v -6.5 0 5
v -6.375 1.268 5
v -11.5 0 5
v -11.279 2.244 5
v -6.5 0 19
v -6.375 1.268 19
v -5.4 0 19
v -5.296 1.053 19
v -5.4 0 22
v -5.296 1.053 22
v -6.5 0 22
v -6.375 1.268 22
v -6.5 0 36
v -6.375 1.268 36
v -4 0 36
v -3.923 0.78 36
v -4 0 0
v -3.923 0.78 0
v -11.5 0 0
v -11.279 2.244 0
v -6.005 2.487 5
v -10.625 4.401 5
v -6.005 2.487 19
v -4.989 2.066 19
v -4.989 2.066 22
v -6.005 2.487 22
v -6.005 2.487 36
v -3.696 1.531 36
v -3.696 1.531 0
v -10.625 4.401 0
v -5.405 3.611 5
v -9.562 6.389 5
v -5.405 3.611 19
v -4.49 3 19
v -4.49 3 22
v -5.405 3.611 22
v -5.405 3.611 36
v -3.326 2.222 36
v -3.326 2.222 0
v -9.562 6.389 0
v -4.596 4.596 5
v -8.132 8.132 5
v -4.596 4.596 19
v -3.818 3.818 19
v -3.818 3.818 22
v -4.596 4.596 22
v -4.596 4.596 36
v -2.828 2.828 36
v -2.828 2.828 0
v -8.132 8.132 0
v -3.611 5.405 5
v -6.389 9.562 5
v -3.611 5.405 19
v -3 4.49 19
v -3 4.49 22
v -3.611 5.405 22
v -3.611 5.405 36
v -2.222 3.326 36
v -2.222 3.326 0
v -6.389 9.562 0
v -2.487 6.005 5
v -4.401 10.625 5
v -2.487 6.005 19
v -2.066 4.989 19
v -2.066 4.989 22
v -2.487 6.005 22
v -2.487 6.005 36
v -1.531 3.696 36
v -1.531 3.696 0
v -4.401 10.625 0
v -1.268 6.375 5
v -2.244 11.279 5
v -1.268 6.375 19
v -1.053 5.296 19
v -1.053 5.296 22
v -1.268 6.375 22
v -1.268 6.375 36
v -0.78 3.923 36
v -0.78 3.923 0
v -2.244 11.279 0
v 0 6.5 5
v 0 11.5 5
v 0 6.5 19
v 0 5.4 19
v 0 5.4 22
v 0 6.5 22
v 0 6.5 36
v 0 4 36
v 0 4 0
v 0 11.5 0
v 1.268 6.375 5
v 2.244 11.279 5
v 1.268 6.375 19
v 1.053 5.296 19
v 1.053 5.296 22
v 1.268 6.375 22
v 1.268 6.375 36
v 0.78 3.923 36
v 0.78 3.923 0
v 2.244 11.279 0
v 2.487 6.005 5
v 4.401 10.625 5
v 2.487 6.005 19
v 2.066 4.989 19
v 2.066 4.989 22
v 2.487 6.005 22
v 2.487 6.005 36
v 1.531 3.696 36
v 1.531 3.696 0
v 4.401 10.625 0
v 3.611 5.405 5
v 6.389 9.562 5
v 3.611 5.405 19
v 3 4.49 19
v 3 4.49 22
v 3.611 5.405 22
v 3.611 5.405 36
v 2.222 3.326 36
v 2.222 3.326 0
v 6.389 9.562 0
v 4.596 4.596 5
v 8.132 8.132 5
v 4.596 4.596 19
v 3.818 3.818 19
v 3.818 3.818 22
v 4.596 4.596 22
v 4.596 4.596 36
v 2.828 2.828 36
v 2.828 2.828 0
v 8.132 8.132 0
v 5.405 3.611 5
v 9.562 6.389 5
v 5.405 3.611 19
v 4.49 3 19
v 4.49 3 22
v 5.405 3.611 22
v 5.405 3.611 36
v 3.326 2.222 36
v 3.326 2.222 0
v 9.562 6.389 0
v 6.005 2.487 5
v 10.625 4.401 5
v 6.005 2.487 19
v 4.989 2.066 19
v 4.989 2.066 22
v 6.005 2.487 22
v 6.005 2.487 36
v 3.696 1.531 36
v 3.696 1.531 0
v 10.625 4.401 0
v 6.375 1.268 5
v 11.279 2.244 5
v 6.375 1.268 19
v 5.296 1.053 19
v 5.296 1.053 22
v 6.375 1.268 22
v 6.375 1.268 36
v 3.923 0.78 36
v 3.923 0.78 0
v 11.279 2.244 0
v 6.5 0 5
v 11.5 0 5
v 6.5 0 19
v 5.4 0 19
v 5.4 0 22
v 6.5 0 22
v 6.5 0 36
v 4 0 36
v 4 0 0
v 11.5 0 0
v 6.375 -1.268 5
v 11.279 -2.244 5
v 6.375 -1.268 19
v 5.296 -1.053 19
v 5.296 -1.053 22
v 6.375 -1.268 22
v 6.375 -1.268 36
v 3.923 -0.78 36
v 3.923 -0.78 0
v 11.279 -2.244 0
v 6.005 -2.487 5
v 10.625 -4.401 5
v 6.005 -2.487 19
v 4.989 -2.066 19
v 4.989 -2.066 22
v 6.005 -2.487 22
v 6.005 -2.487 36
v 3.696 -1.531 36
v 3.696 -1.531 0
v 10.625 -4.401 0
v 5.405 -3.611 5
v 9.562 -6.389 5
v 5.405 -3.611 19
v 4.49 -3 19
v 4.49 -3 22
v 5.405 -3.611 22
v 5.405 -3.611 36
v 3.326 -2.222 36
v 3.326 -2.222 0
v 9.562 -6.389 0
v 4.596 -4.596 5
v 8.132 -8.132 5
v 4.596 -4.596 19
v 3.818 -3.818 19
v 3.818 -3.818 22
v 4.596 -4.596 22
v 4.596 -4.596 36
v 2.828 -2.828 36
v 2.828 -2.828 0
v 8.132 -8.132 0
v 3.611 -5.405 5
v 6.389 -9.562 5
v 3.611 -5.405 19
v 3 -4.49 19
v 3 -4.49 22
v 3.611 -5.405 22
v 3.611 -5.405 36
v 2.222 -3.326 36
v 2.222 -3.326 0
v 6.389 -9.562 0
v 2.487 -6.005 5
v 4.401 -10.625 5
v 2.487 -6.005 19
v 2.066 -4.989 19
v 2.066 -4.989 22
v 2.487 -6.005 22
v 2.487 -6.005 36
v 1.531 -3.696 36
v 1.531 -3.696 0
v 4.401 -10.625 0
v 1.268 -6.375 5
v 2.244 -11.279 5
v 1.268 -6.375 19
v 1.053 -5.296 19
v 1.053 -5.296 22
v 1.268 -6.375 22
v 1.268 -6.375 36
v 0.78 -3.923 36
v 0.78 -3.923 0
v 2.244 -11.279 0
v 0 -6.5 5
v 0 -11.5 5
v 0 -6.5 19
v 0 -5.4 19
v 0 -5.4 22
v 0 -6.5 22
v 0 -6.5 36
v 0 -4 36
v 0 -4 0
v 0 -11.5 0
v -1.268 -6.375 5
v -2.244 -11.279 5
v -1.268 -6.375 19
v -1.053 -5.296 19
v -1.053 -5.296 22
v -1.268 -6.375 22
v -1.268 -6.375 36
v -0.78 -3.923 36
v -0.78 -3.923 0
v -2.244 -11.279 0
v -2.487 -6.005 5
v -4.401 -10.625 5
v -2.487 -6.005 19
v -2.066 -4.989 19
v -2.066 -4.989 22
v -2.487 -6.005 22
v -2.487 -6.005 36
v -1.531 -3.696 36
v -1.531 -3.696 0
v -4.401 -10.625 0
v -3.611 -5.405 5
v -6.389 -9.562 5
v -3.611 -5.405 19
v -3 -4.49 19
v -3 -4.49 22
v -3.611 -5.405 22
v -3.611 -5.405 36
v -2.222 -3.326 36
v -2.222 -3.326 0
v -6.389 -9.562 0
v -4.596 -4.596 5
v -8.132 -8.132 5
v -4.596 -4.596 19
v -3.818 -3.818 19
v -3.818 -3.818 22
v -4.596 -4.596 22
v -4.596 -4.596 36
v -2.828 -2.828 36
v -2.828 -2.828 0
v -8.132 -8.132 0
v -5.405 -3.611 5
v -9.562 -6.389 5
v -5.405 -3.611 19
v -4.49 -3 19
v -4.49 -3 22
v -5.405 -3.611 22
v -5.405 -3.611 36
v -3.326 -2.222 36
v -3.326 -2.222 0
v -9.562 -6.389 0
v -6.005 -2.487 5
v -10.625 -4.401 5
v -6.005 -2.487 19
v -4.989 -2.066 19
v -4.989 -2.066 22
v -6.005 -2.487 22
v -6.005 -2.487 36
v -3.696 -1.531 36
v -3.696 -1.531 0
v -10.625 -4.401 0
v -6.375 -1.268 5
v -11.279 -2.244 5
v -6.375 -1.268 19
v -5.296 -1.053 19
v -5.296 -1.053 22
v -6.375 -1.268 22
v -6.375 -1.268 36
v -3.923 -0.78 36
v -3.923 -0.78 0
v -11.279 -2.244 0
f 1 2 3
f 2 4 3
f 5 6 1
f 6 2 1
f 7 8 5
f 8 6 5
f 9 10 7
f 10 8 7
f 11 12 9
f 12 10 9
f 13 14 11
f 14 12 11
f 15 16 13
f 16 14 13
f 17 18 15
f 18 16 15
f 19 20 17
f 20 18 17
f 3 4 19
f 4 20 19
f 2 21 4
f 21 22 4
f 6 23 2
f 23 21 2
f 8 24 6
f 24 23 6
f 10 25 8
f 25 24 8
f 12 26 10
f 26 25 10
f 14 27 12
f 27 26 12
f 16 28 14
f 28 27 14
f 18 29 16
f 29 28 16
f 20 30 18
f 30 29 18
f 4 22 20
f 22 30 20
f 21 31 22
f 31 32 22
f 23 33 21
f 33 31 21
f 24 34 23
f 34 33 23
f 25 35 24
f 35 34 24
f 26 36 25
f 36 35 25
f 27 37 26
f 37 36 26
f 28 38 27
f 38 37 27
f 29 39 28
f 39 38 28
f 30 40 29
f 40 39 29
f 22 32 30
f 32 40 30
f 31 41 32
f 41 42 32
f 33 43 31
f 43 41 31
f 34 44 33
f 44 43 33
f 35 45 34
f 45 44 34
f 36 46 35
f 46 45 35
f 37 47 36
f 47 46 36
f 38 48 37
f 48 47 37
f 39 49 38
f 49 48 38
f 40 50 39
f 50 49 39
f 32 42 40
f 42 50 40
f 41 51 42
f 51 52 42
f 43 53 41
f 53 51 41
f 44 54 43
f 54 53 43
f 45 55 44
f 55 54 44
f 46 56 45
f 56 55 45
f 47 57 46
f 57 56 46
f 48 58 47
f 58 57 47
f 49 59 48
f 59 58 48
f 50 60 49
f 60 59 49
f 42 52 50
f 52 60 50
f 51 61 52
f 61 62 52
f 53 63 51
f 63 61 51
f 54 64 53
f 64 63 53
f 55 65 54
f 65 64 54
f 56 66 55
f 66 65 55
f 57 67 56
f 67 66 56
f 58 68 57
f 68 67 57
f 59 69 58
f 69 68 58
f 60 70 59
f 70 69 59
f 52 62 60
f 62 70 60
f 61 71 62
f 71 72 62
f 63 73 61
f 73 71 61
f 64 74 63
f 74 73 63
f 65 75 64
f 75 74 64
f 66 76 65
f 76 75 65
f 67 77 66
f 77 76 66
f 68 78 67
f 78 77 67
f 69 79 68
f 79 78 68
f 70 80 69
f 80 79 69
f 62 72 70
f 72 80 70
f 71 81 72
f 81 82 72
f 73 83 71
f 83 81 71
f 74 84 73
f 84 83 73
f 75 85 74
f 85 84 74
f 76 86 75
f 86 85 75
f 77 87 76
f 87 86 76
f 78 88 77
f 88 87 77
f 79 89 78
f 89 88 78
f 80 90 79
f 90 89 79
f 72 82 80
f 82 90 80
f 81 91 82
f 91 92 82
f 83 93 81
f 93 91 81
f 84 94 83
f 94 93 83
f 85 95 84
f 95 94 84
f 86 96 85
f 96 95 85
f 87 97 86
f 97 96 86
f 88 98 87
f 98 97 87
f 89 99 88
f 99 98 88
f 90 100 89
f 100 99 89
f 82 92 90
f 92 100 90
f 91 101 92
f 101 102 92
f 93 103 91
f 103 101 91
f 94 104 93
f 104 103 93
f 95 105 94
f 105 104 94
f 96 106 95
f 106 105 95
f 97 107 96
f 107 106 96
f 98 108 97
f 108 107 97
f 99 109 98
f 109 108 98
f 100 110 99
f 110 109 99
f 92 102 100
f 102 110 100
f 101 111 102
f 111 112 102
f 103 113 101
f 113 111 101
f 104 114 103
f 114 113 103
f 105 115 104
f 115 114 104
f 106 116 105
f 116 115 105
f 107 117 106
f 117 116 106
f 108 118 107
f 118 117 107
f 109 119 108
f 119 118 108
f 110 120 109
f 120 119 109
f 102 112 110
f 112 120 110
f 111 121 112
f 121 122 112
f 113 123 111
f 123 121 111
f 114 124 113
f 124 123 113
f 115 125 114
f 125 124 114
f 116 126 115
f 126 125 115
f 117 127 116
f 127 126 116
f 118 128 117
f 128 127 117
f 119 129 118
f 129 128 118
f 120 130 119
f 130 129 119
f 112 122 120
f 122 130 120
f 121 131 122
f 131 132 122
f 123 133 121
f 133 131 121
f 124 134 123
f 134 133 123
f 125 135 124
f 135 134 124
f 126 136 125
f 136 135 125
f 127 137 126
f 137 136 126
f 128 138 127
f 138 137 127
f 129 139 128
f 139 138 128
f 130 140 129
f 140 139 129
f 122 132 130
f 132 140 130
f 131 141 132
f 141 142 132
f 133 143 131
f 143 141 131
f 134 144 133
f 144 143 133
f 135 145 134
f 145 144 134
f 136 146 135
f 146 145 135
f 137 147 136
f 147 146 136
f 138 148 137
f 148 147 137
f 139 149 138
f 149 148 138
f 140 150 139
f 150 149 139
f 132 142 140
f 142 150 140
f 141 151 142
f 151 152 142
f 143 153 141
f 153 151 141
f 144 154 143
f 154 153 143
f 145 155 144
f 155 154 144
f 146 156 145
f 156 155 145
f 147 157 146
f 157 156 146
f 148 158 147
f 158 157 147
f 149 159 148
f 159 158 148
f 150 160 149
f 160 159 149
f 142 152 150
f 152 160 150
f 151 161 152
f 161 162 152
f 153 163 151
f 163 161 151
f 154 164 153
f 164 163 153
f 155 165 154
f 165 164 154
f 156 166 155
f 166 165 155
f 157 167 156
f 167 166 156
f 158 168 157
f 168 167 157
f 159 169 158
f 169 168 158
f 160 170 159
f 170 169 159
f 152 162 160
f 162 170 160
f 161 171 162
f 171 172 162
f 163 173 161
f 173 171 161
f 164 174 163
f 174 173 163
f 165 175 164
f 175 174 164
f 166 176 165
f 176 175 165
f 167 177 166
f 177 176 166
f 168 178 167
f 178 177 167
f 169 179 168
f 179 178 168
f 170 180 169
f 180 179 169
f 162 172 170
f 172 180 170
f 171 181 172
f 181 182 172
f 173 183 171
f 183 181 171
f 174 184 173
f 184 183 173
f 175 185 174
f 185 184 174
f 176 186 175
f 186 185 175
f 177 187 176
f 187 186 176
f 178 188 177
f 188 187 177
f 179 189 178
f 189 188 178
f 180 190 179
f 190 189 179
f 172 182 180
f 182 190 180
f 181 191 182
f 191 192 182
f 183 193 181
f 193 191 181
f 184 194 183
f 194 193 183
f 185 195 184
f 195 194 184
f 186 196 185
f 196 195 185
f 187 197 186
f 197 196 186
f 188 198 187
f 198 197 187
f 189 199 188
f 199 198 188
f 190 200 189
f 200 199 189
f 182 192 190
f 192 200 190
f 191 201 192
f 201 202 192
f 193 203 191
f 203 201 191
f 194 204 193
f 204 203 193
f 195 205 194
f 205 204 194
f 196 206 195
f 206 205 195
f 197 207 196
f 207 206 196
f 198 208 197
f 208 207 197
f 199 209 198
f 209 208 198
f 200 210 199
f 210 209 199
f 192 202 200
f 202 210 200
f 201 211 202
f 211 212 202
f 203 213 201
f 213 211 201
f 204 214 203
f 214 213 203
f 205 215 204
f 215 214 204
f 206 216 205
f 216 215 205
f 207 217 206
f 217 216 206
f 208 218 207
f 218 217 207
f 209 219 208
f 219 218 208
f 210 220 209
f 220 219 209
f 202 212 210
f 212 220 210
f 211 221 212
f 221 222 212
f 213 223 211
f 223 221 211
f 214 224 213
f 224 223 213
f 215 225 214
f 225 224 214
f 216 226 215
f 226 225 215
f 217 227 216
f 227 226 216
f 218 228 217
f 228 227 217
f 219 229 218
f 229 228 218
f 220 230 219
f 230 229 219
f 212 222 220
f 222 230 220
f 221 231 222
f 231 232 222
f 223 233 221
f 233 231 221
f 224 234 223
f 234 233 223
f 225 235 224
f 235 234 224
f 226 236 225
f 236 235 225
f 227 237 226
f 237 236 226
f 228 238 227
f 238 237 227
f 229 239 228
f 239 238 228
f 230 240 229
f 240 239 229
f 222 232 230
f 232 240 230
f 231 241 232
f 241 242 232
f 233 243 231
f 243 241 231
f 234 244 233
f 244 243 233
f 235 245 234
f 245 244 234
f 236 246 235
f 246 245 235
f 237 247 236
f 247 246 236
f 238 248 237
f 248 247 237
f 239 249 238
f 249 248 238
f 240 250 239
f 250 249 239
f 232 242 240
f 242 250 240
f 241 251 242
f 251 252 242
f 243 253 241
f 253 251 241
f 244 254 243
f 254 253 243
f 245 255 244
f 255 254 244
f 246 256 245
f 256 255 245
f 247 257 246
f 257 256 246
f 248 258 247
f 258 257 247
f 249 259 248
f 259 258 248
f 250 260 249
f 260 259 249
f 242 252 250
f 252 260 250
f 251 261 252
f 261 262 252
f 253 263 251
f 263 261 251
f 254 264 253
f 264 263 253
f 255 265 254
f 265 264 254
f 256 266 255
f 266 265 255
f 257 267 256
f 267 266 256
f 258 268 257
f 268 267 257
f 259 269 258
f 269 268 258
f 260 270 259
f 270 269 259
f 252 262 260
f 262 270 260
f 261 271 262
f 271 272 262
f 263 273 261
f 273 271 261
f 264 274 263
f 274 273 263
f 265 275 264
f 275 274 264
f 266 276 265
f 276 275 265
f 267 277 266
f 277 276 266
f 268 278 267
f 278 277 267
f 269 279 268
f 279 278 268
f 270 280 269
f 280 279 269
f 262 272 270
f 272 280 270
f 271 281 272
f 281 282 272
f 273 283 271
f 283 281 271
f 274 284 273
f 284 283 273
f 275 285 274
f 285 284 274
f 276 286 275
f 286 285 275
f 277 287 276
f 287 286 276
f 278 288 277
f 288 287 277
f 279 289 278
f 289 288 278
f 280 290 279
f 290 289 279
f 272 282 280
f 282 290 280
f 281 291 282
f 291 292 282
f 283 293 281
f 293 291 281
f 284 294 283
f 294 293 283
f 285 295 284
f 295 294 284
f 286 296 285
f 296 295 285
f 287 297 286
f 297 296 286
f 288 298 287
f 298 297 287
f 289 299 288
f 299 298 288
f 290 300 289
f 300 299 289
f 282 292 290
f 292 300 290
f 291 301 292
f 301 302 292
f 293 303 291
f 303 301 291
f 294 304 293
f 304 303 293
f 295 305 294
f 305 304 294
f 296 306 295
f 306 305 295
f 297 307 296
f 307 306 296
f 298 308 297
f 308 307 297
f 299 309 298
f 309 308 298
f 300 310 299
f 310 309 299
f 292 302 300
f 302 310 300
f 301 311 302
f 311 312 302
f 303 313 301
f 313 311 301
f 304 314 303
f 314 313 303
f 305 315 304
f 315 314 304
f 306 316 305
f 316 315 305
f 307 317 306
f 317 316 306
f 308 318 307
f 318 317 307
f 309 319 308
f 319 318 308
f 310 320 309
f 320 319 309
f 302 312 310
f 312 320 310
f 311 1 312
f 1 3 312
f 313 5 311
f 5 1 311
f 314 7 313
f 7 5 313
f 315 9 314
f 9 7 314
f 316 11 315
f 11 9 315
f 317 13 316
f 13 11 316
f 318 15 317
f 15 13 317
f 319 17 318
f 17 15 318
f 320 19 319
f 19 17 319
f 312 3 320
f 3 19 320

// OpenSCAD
$fn = 32;

// ----------------------------------------------------------------------
// Grooved revolve: flanged, bore R4
// ----------------------------------------------------------------------

// --- parameters (mm) ---
bore_r = 4;               // bore radius
outer_r = 6.5;            // outer radius of the body
total_h = 36;             // overall height, Z
wall = 2.5;               // radial wall thickness
groove_w = 3;             // groove width
groove_d = 1.1;           // groove depth
grooves = 1;              // number of outer grooves
flange_r = 11.5;          // flange radius
flange_h = 5;             // flange height

bbox_x = 2 * flange_r;  // full diameter
bore_d = 2 * bore_r;  // bore diameter
body_d = 2 * outer_r;  // body diameter
flange_d = 2 * flange_r;  // flange diameter
revolve_angle = 360;  // full turn around the Z axis

profile = [[4, 0], [6.5, 0], [11.5, 0], [11.5, 5], [6.5, 5], [6.5, 19], [5.4, 19], [5.4, 22], [6.5, 22], [6.5, 36], [4, 36]];  // primary outline, 11 points, counter clockwise

// --- the one profile operation ---
rotate_extrude(angle = revolve_angle) polygon(points = profile);
